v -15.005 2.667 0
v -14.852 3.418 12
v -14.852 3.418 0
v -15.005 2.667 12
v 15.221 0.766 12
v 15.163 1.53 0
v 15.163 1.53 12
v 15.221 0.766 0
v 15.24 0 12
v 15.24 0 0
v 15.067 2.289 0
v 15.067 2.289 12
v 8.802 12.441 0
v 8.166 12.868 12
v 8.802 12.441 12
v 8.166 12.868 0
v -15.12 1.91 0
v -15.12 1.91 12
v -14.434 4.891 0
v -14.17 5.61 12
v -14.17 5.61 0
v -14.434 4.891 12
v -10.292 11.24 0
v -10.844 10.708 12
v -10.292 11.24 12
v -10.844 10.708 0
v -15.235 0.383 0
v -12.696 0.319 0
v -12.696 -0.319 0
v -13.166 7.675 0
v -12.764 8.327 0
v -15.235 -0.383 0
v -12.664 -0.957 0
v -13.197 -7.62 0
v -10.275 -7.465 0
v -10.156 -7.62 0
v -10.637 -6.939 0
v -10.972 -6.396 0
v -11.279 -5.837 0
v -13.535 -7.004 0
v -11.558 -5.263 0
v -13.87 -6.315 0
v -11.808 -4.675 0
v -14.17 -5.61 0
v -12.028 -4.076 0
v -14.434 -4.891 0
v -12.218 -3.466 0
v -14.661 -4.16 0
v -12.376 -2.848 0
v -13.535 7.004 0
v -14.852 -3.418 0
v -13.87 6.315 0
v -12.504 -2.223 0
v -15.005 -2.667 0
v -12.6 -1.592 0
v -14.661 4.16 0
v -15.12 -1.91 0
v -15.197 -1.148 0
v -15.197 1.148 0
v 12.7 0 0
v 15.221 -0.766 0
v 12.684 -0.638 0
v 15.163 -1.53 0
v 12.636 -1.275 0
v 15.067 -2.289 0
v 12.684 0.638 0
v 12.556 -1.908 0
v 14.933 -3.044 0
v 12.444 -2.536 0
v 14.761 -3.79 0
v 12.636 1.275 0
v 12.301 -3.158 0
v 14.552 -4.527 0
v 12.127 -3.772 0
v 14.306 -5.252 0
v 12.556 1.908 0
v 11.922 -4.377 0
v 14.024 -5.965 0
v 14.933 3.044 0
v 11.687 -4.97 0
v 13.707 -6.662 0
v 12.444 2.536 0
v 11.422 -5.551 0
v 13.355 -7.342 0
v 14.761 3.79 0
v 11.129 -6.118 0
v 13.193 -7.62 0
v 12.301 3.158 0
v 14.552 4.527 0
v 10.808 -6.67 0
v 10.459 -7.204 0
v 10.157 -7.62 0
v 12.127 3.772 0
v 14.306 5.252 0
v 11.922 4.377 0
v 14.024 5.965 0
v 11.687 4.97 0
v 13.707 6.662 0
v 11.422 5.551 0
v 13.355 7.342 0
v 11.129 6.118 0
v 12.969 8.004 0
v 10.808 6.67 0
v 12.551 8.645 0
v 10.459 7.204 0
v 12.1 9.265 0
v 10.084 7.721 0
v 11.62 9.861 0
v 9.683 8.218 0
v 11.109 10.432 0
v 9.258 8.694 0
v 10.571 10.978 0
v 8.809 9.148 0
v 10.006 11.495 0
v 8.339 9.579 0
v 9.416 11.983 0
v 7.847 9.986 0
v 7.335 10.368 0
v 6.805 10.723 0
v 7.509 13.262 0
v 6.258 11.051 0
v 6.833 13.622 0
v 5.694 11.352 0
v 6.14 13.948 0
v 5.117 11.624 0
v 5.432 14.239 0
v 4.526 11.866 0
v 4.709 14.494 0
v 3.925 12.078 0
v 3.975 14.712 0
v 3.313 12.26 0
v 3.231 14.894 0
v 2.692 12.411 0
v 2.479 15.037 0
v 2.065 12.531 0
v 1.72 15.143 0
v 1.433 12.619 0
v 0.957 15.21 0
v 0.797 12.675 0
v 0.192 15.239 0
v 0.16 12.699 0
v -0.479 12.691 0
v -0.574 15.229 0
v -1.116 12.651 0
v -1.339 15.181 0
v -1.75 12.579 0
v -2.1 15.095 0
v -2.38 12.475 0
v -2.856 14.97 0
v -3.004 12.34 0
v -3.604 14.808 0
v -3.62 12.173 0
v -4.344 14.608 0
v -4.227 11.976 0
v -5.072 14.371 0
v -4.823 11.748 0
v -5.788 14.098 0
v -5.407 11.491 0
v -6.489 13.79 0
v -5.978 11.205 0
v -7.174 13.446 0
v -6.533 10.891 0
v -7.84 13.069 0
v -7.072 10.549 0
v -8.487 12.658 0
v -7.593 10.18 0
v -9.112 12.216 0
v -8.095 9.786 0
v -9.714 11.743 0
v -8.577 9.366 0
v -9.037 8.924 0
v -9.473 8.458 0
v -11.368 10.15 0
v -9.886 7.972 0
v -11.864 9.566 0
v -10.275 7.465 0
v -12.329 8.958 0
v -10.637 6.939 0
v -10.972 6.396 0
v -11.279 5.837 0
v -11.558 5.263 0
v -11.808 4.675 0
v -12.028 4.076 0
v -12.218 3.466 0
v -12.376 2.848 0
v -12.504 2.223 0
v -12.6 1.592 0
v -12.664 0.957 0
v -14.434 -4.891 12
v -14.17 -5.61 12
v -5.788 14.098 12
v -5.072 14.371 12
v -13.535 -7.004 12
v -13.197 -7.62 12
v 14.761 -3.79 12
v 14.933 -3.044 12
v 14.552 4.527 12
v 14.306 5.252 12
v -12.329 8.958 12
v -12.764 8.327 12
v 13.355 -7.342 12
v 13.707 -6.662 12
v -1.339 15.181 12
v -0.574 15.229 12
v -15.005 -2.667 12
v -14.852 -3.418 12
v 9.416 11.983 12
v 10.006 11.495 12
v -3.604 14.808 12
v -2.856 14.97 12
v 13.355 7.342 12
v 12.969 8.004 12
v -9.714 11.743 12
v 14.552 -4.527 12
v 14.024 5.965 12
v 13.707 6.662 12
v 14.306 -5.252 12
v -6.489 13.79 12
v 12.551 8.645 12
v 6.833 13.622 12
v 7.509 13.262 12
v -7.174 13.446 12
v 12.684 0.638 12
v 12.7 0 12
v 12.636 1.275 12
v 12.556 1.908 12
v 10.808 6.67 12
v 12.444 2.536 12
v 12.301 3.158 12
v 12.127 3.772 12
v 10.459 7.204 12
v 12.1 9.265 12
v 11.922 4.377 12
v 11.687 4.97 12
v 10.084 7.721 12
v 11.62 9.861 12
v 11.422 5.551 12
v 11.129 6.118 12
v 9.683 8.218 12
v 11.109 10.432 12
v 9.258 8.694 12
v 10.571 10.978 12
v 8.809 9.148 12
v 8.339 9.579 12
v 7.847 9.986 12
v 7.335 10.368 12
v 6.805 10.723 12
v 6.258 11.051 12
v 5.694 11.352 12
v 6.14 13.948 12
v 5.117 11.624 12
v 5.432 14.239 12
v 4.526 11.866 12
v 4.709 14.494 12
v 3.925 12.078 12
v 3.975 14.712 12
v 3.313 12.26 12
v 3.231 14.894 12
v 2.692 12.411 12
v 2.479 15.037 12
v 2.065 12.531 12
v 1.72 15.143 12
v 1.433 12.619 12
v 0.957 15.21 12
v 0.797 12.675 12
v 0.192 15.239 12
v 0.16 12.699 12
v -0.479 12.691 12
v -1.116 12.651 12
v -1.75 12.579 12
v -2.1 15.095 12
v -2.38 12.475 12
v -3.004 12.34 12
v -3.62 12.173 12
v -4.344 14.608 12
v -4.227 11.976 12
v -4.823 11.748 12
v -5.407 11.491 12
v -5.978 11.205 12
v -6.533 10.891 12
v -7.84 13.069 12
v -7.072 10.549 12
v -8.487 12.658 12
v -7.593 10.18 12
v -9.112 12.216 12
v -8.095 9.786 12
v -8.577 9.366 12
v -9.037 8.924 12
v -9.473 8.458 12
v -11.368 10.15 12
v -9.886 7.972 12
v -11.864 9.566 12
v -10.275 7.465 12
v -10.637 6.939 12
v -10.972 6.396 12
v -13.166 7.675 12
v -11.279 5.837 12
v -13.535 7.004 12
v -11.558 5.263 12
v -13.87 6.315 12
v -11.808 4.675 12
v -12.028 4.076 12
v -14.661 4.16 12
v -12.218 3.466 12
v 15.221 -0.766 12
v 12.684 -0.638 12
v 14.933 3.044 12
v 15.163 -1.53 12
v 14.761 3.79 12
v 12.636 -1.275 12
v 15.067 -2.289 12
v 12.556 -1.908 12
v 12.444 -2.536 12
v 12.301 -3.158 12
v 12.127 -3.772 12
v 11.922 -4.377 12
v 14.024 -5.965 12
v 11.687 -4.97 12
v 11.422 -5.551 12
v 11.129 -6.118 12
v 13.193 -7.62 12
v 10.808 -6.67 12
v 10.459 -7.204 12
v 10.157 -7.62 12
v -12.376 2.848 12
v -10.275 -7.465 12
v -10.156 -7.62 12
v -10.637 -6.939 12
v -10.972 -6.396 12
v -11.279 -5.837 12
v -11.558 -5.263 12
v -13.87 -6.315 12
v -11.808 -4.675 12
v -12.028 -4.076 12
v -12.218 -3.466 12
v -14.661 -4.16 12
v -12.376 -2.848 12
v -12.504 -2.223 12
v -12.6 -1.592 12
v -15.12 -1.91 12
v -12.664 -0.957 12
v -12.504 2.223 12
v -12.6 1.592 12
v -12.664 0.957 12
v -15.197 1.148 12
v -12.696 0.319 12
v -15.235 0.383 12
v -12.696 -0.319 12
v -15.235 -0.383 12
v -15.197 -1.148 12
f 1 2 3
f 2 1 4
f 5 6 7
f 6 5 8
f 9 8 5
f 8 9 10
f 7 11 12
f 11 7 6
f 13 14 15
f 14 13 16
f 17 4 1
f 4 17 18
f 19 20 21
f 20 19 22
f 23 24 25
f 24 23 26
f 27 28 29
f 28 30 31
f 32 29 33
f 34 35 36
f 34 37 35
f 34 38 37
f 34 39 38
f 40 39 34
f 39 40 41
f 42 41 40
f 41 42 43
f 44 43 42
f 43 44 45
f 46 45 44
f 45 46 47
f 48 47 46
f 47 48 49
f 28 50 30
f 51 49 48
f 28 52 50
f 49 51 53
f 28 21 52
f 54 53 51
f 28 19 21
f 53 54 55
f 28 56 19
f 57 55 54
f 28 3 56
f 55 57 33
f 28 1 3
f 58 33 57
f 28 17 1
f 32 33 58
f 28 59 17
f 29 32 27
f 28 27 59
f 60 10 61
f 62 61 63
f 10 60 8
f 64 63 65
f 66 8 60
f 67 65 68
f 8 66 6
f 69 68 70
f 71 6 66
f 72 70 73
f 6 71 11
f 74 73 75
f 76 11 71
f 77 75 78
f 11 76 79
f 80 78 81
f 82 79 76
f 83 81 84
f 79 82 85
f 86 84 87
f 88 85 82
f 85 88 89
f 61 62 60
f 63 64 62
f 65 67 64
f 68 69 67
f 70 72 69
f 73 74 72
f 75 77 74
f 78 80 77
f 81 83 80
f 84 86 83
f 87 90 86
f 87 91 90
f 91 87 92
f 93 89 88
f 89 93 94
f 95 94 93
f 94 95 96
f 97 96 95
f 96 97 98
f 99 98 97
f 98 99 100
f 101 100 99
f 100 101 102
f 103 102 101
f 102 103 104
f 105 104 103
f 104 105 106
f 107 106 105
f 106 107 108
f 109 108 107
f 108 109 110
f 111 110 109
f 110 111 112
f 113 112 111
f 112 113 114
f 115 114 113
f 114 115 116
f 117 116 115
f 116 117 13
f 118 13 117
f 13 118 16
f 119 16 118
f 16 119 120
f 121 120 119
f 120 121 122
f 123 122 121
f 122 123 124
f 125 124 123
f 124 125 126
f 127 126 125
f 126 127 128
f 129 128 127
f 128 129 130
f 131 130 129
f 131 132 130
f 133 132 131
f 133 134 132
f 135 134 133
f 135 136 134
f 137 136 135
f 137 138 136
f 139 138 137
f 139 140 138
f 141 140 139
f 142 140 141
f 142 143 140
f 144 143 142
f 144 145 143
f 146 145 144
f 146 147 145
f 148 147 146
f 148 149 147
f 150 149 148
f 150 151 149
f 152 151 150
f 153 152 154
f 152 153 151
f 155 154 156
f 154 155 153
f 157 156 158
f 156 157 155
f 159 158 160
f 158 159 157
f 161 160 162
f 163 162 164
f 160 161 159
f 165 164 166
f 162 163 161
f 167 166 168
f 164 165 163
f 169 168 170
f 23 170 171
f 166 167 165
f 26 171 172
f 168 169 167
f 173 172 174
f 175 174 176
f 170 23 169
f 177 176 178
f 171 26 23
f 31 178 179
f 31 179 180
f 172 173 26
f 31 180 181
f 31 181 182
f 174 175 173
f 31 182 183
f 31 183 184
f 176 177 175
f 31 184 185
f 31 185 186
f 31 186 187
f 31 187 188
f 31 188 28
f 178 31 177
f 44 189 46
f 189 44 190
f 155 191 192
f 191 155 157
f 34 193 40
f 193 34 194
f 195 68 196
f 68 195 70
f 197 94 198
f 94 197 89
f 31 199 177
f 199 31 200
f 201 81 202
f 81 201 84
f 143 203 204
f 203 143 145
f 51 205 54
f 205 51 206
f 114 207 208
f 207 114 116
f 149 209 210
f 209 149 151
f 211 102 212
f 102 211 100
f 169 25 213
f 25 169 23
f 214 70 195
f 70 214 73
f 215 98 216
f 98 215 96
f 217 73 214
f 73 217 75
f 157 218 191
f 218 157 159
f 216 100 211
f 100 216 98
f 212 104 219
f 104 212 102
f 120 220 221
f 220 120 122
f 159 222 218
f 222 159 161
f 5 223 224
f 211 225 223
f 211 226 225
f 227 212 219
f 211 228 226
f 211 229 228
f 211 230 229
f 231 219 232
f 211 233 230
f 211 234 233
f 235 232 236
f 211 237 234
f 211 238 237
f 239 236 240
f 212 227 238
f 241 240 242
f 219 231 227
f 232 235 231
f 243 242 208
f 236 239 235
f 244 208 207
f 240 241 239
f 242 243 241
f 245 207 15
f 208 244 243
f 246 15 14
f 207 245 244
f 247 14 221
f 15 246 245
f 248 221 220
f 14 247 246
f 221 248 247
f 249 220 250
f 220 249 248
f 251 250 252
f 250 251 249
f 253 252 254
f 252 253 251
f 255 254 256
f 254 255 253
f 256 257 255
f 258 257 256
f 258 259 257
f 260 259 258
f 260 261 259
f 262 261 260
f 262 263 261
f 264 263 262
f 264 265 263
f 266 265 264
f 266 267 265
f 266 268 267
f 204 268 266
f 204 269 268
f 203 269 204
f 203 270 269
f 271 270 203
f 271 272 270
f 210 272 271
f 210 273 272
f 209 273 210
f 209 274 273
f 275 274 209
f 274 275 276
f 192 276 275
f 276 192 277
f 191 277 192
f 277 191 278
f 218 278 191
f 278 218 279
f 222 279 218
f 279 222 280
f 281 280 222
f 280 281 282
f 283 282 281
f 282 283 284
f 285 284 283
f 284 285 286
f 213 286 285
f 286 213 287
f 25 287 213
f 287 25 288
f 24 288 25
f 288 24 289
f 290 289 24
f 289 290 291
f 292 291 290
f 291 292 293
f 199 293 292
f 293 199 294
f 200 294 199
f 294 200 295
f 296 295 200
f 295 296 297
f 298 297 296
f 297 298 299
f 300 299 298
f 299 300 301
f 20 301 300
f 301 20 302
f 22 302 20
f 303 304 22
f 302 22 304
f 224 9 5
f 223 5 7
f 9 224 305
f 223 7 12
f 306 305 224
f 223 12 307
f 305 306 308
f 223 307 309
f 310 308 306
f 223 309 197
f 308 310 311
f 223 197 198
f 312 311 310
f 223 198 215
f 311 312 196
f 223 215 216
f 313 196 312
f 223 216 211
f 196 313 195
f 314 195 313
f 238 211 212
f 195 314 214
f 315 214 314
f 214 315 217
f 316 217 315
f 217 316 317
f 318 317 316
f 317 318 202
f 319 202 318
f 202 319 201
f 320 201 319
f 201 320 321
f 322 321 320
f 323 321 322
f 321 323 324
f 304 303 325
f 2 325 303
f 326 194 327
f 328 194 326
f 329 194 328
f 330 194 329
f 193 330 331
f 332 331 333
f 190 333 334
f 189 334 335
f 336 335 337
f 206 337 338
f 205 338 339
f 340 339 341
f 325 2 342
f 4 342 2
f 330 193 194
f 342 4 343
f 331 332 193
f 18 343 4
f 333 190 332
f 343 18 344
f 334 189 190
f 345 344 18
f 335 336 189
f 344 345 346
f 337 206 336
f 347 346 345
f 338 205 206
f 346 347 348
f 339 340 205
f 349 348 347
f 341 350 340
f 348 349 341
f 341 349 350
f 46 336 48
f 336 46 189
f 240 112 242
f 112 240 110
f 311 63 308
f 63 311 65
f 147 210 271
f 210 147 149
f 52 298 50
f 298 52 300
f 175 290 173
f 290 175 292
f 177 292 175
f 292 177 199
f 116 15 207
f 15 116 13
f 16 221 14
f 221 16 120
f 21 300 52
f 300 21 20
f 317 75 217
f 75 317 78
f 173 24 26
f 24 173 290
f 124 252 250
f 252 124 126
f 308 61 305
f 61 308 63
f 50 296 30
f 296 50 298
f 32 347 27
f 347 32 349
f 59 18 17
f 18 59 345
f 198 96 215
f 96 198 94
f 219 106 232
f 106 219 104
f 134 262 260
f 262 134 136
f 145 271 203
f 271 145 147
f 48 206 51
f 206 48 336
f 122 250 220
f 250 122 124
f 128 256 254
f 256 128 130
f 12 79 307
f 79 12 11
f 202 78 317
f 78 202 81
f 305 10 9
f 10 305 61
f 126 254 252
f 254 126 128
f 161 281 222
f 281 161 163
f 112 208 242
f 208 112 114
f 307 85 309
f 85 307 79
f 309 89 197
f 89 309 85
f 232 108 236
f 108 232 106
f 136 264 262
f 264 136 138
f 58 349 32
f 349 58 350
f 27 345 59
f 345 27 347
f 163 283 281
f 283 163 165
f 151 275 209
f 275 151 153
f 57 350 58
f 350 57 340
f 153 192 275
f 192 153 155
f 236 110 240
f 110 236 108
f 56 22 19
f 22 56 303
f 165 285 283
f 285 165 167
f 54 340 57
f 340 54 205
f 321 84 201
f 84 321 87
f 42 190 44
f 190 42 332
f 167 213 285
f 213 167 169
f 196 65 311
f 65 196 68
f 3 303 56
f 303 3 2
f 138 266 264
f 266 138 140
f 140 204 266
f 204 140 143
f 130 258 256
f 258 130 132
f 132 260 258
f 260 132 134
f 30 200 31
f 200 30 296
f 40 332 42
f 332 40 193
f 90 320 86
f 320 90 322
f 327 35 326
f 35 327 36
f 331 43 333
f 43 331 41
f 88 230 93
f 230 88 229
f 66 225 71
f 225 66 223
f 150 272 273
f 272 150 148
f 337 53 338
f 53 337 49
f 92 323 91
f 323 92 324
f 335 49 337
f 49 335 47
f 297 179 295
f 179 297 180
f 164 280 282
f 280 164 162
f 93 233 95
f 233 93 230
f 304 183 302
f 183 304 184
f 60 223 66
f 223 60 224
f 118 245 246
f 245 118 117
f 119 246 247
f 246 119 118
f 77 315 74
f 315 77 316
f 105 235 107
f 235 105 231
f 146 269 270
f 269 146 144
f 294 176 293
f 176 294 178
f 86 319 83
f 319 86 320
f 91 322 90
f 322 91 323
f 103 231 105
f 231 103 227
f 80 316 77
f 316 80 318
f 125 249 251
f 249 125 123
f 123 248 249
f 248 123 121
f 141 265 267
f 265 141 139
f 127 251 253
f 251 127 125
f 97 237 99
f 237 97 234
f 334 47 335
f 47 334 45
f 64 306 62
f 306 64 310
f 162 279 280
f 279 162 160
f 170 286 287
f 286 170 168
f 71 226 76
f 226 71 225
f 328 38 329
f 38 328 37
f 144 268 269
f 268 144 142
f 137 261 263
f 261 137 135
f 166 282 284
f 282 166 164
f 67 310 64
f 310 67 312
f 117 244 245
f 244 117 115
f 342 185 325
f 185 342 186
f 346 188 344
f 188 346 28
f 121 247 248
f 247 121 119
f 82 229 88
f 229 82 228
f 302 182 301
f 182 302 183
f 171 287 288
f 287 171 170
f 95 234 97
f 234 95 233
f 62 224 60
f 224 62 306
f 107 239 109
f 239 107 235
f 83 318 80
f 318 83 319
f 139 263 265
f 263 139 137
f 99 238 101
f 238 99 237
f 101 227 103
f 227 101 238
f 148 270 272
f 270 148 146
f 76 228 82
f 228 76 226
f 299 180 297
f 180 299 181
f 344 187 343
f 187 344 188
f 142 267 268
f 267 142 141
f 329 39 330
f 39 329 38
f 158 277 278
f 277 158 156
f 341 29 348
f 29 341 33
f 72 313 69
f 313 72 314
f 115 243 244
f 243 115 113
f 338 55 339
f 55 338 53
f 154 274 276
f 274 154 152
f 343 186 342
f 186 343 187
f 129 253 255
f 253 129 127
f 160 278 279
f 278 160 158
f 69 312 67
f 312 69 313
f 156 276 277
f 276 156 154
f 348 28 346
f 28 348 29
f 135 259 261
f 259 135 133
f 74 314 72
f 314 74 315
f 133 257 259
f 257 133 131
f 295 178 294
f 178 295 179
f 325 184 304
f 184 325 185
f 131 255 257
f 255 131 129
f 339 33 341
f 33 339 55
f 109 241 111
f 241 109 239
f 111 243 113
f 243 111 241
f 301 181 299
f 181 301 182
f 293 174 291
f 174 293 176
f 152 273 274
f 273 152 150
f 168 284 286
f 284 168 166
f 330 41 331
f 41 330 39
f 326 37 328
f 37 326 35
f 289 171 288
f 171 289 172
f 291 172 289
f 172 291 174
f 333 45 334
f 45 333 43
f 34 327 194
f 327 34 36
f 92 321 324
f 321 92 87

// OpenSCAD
inch = 25.4;
scale_factor = 1.2;
inner_r = inch / 2;
outter_r = inner_r * scale_factor;
height = 12;
$fn=125;


difference() {
    difference() {
        cylinder(h = height, r = outter_r);
        cylinder(h = height, r = inner_r);
    }
    
    translate([(inner_r * -scale_factor), (inner_r * -(scale_factor * 2.5)), 0]) {
        cube((outter_r * 2));
    }
}
